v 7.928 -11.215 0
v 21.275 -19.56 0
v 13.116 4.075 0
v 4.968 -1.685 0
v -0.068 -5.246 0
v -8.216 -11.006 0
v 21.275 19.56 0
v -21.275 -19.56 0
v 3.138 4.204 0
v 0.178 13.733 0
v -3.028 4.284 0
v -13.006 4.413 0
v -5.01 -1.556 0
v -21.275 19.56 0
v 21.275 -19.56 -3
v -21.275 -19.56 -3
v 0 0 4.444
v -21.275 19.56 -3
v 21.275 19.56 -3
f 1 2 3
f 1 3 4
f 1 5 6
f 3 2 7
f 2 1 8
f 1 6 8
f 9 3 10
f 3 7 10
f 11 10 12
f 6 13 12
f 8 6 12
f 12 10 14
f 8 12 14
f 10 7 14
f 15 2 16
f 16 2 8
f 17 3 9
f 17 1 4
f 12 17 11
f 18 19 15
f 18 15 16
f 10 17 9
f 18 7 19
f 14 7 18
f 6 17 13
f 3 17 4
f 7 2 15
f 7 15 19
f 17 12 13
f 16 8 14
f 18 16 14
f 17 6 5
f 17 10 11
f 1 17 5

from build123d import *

# Parameters (mm, degrees)
SCALE1_SCALE        = 0.222222222
SKETCH5_W           = 42.55
SKETCH5_H           = 39.12
BOSS_EXTRUDE1_DEPTH = 3


with BuildPart() as part:
    # Sketch2 → Loft1 section 0
    with BuildSketch(Plane.XY, mode=Mode.PRIVATE) as loft1_s0:
        with BuildLine():
            Line((0.798818744, 61.79823623), (-13.627719918, 19.2760512))
            Line((-13.627719918, 19.2760512), (-58.526766695, 19.856426989))
            Line((-58.526766695, 19.856426989), (-22.543811151, -7.004104425))
            Line((-22.543811151, -7.004104425), (-36.970349813, -49.526289455))
            Line((-36.970349813, -49.526289455), (-0.305121609, -23.604825795))
            Line((-0.305121609, -23.604825795), (35.677833934, -50.465357209))
            Line((35.677833934, -50.465357209), (22.355235626, -7.584480215))
            Line((22.355235626, -7.584480215), (59.020463829, 18.336983445))
            Line((59.020463829, 18.336983445), (14.121417053, 18.917359235))
            Line((14.121417053, 18.917359235), (0.798818744, 61.79823623))
        make_face()
    loft([loft1_s0.sketch, Vertex(0, 0, 20)])


with BuildPart() as part_1:
    # Scale1: scaled about (0, 0, 0)
    add(part.part.scale(SCALE1_SCALE))

    # Sketch5 → Boss-Extrude1 (add)
    with BuildSketch(Plane(origin=(0, 0, 0), x_dir=(-1, 0, 0), z_dir=(0, 0, -1))):
        Rectangle(SKETCH5_W, SKETCH5_H)
    extrude(amount=BOSS_EXTRUDE1_DEPTH)


solid = part_1.part
